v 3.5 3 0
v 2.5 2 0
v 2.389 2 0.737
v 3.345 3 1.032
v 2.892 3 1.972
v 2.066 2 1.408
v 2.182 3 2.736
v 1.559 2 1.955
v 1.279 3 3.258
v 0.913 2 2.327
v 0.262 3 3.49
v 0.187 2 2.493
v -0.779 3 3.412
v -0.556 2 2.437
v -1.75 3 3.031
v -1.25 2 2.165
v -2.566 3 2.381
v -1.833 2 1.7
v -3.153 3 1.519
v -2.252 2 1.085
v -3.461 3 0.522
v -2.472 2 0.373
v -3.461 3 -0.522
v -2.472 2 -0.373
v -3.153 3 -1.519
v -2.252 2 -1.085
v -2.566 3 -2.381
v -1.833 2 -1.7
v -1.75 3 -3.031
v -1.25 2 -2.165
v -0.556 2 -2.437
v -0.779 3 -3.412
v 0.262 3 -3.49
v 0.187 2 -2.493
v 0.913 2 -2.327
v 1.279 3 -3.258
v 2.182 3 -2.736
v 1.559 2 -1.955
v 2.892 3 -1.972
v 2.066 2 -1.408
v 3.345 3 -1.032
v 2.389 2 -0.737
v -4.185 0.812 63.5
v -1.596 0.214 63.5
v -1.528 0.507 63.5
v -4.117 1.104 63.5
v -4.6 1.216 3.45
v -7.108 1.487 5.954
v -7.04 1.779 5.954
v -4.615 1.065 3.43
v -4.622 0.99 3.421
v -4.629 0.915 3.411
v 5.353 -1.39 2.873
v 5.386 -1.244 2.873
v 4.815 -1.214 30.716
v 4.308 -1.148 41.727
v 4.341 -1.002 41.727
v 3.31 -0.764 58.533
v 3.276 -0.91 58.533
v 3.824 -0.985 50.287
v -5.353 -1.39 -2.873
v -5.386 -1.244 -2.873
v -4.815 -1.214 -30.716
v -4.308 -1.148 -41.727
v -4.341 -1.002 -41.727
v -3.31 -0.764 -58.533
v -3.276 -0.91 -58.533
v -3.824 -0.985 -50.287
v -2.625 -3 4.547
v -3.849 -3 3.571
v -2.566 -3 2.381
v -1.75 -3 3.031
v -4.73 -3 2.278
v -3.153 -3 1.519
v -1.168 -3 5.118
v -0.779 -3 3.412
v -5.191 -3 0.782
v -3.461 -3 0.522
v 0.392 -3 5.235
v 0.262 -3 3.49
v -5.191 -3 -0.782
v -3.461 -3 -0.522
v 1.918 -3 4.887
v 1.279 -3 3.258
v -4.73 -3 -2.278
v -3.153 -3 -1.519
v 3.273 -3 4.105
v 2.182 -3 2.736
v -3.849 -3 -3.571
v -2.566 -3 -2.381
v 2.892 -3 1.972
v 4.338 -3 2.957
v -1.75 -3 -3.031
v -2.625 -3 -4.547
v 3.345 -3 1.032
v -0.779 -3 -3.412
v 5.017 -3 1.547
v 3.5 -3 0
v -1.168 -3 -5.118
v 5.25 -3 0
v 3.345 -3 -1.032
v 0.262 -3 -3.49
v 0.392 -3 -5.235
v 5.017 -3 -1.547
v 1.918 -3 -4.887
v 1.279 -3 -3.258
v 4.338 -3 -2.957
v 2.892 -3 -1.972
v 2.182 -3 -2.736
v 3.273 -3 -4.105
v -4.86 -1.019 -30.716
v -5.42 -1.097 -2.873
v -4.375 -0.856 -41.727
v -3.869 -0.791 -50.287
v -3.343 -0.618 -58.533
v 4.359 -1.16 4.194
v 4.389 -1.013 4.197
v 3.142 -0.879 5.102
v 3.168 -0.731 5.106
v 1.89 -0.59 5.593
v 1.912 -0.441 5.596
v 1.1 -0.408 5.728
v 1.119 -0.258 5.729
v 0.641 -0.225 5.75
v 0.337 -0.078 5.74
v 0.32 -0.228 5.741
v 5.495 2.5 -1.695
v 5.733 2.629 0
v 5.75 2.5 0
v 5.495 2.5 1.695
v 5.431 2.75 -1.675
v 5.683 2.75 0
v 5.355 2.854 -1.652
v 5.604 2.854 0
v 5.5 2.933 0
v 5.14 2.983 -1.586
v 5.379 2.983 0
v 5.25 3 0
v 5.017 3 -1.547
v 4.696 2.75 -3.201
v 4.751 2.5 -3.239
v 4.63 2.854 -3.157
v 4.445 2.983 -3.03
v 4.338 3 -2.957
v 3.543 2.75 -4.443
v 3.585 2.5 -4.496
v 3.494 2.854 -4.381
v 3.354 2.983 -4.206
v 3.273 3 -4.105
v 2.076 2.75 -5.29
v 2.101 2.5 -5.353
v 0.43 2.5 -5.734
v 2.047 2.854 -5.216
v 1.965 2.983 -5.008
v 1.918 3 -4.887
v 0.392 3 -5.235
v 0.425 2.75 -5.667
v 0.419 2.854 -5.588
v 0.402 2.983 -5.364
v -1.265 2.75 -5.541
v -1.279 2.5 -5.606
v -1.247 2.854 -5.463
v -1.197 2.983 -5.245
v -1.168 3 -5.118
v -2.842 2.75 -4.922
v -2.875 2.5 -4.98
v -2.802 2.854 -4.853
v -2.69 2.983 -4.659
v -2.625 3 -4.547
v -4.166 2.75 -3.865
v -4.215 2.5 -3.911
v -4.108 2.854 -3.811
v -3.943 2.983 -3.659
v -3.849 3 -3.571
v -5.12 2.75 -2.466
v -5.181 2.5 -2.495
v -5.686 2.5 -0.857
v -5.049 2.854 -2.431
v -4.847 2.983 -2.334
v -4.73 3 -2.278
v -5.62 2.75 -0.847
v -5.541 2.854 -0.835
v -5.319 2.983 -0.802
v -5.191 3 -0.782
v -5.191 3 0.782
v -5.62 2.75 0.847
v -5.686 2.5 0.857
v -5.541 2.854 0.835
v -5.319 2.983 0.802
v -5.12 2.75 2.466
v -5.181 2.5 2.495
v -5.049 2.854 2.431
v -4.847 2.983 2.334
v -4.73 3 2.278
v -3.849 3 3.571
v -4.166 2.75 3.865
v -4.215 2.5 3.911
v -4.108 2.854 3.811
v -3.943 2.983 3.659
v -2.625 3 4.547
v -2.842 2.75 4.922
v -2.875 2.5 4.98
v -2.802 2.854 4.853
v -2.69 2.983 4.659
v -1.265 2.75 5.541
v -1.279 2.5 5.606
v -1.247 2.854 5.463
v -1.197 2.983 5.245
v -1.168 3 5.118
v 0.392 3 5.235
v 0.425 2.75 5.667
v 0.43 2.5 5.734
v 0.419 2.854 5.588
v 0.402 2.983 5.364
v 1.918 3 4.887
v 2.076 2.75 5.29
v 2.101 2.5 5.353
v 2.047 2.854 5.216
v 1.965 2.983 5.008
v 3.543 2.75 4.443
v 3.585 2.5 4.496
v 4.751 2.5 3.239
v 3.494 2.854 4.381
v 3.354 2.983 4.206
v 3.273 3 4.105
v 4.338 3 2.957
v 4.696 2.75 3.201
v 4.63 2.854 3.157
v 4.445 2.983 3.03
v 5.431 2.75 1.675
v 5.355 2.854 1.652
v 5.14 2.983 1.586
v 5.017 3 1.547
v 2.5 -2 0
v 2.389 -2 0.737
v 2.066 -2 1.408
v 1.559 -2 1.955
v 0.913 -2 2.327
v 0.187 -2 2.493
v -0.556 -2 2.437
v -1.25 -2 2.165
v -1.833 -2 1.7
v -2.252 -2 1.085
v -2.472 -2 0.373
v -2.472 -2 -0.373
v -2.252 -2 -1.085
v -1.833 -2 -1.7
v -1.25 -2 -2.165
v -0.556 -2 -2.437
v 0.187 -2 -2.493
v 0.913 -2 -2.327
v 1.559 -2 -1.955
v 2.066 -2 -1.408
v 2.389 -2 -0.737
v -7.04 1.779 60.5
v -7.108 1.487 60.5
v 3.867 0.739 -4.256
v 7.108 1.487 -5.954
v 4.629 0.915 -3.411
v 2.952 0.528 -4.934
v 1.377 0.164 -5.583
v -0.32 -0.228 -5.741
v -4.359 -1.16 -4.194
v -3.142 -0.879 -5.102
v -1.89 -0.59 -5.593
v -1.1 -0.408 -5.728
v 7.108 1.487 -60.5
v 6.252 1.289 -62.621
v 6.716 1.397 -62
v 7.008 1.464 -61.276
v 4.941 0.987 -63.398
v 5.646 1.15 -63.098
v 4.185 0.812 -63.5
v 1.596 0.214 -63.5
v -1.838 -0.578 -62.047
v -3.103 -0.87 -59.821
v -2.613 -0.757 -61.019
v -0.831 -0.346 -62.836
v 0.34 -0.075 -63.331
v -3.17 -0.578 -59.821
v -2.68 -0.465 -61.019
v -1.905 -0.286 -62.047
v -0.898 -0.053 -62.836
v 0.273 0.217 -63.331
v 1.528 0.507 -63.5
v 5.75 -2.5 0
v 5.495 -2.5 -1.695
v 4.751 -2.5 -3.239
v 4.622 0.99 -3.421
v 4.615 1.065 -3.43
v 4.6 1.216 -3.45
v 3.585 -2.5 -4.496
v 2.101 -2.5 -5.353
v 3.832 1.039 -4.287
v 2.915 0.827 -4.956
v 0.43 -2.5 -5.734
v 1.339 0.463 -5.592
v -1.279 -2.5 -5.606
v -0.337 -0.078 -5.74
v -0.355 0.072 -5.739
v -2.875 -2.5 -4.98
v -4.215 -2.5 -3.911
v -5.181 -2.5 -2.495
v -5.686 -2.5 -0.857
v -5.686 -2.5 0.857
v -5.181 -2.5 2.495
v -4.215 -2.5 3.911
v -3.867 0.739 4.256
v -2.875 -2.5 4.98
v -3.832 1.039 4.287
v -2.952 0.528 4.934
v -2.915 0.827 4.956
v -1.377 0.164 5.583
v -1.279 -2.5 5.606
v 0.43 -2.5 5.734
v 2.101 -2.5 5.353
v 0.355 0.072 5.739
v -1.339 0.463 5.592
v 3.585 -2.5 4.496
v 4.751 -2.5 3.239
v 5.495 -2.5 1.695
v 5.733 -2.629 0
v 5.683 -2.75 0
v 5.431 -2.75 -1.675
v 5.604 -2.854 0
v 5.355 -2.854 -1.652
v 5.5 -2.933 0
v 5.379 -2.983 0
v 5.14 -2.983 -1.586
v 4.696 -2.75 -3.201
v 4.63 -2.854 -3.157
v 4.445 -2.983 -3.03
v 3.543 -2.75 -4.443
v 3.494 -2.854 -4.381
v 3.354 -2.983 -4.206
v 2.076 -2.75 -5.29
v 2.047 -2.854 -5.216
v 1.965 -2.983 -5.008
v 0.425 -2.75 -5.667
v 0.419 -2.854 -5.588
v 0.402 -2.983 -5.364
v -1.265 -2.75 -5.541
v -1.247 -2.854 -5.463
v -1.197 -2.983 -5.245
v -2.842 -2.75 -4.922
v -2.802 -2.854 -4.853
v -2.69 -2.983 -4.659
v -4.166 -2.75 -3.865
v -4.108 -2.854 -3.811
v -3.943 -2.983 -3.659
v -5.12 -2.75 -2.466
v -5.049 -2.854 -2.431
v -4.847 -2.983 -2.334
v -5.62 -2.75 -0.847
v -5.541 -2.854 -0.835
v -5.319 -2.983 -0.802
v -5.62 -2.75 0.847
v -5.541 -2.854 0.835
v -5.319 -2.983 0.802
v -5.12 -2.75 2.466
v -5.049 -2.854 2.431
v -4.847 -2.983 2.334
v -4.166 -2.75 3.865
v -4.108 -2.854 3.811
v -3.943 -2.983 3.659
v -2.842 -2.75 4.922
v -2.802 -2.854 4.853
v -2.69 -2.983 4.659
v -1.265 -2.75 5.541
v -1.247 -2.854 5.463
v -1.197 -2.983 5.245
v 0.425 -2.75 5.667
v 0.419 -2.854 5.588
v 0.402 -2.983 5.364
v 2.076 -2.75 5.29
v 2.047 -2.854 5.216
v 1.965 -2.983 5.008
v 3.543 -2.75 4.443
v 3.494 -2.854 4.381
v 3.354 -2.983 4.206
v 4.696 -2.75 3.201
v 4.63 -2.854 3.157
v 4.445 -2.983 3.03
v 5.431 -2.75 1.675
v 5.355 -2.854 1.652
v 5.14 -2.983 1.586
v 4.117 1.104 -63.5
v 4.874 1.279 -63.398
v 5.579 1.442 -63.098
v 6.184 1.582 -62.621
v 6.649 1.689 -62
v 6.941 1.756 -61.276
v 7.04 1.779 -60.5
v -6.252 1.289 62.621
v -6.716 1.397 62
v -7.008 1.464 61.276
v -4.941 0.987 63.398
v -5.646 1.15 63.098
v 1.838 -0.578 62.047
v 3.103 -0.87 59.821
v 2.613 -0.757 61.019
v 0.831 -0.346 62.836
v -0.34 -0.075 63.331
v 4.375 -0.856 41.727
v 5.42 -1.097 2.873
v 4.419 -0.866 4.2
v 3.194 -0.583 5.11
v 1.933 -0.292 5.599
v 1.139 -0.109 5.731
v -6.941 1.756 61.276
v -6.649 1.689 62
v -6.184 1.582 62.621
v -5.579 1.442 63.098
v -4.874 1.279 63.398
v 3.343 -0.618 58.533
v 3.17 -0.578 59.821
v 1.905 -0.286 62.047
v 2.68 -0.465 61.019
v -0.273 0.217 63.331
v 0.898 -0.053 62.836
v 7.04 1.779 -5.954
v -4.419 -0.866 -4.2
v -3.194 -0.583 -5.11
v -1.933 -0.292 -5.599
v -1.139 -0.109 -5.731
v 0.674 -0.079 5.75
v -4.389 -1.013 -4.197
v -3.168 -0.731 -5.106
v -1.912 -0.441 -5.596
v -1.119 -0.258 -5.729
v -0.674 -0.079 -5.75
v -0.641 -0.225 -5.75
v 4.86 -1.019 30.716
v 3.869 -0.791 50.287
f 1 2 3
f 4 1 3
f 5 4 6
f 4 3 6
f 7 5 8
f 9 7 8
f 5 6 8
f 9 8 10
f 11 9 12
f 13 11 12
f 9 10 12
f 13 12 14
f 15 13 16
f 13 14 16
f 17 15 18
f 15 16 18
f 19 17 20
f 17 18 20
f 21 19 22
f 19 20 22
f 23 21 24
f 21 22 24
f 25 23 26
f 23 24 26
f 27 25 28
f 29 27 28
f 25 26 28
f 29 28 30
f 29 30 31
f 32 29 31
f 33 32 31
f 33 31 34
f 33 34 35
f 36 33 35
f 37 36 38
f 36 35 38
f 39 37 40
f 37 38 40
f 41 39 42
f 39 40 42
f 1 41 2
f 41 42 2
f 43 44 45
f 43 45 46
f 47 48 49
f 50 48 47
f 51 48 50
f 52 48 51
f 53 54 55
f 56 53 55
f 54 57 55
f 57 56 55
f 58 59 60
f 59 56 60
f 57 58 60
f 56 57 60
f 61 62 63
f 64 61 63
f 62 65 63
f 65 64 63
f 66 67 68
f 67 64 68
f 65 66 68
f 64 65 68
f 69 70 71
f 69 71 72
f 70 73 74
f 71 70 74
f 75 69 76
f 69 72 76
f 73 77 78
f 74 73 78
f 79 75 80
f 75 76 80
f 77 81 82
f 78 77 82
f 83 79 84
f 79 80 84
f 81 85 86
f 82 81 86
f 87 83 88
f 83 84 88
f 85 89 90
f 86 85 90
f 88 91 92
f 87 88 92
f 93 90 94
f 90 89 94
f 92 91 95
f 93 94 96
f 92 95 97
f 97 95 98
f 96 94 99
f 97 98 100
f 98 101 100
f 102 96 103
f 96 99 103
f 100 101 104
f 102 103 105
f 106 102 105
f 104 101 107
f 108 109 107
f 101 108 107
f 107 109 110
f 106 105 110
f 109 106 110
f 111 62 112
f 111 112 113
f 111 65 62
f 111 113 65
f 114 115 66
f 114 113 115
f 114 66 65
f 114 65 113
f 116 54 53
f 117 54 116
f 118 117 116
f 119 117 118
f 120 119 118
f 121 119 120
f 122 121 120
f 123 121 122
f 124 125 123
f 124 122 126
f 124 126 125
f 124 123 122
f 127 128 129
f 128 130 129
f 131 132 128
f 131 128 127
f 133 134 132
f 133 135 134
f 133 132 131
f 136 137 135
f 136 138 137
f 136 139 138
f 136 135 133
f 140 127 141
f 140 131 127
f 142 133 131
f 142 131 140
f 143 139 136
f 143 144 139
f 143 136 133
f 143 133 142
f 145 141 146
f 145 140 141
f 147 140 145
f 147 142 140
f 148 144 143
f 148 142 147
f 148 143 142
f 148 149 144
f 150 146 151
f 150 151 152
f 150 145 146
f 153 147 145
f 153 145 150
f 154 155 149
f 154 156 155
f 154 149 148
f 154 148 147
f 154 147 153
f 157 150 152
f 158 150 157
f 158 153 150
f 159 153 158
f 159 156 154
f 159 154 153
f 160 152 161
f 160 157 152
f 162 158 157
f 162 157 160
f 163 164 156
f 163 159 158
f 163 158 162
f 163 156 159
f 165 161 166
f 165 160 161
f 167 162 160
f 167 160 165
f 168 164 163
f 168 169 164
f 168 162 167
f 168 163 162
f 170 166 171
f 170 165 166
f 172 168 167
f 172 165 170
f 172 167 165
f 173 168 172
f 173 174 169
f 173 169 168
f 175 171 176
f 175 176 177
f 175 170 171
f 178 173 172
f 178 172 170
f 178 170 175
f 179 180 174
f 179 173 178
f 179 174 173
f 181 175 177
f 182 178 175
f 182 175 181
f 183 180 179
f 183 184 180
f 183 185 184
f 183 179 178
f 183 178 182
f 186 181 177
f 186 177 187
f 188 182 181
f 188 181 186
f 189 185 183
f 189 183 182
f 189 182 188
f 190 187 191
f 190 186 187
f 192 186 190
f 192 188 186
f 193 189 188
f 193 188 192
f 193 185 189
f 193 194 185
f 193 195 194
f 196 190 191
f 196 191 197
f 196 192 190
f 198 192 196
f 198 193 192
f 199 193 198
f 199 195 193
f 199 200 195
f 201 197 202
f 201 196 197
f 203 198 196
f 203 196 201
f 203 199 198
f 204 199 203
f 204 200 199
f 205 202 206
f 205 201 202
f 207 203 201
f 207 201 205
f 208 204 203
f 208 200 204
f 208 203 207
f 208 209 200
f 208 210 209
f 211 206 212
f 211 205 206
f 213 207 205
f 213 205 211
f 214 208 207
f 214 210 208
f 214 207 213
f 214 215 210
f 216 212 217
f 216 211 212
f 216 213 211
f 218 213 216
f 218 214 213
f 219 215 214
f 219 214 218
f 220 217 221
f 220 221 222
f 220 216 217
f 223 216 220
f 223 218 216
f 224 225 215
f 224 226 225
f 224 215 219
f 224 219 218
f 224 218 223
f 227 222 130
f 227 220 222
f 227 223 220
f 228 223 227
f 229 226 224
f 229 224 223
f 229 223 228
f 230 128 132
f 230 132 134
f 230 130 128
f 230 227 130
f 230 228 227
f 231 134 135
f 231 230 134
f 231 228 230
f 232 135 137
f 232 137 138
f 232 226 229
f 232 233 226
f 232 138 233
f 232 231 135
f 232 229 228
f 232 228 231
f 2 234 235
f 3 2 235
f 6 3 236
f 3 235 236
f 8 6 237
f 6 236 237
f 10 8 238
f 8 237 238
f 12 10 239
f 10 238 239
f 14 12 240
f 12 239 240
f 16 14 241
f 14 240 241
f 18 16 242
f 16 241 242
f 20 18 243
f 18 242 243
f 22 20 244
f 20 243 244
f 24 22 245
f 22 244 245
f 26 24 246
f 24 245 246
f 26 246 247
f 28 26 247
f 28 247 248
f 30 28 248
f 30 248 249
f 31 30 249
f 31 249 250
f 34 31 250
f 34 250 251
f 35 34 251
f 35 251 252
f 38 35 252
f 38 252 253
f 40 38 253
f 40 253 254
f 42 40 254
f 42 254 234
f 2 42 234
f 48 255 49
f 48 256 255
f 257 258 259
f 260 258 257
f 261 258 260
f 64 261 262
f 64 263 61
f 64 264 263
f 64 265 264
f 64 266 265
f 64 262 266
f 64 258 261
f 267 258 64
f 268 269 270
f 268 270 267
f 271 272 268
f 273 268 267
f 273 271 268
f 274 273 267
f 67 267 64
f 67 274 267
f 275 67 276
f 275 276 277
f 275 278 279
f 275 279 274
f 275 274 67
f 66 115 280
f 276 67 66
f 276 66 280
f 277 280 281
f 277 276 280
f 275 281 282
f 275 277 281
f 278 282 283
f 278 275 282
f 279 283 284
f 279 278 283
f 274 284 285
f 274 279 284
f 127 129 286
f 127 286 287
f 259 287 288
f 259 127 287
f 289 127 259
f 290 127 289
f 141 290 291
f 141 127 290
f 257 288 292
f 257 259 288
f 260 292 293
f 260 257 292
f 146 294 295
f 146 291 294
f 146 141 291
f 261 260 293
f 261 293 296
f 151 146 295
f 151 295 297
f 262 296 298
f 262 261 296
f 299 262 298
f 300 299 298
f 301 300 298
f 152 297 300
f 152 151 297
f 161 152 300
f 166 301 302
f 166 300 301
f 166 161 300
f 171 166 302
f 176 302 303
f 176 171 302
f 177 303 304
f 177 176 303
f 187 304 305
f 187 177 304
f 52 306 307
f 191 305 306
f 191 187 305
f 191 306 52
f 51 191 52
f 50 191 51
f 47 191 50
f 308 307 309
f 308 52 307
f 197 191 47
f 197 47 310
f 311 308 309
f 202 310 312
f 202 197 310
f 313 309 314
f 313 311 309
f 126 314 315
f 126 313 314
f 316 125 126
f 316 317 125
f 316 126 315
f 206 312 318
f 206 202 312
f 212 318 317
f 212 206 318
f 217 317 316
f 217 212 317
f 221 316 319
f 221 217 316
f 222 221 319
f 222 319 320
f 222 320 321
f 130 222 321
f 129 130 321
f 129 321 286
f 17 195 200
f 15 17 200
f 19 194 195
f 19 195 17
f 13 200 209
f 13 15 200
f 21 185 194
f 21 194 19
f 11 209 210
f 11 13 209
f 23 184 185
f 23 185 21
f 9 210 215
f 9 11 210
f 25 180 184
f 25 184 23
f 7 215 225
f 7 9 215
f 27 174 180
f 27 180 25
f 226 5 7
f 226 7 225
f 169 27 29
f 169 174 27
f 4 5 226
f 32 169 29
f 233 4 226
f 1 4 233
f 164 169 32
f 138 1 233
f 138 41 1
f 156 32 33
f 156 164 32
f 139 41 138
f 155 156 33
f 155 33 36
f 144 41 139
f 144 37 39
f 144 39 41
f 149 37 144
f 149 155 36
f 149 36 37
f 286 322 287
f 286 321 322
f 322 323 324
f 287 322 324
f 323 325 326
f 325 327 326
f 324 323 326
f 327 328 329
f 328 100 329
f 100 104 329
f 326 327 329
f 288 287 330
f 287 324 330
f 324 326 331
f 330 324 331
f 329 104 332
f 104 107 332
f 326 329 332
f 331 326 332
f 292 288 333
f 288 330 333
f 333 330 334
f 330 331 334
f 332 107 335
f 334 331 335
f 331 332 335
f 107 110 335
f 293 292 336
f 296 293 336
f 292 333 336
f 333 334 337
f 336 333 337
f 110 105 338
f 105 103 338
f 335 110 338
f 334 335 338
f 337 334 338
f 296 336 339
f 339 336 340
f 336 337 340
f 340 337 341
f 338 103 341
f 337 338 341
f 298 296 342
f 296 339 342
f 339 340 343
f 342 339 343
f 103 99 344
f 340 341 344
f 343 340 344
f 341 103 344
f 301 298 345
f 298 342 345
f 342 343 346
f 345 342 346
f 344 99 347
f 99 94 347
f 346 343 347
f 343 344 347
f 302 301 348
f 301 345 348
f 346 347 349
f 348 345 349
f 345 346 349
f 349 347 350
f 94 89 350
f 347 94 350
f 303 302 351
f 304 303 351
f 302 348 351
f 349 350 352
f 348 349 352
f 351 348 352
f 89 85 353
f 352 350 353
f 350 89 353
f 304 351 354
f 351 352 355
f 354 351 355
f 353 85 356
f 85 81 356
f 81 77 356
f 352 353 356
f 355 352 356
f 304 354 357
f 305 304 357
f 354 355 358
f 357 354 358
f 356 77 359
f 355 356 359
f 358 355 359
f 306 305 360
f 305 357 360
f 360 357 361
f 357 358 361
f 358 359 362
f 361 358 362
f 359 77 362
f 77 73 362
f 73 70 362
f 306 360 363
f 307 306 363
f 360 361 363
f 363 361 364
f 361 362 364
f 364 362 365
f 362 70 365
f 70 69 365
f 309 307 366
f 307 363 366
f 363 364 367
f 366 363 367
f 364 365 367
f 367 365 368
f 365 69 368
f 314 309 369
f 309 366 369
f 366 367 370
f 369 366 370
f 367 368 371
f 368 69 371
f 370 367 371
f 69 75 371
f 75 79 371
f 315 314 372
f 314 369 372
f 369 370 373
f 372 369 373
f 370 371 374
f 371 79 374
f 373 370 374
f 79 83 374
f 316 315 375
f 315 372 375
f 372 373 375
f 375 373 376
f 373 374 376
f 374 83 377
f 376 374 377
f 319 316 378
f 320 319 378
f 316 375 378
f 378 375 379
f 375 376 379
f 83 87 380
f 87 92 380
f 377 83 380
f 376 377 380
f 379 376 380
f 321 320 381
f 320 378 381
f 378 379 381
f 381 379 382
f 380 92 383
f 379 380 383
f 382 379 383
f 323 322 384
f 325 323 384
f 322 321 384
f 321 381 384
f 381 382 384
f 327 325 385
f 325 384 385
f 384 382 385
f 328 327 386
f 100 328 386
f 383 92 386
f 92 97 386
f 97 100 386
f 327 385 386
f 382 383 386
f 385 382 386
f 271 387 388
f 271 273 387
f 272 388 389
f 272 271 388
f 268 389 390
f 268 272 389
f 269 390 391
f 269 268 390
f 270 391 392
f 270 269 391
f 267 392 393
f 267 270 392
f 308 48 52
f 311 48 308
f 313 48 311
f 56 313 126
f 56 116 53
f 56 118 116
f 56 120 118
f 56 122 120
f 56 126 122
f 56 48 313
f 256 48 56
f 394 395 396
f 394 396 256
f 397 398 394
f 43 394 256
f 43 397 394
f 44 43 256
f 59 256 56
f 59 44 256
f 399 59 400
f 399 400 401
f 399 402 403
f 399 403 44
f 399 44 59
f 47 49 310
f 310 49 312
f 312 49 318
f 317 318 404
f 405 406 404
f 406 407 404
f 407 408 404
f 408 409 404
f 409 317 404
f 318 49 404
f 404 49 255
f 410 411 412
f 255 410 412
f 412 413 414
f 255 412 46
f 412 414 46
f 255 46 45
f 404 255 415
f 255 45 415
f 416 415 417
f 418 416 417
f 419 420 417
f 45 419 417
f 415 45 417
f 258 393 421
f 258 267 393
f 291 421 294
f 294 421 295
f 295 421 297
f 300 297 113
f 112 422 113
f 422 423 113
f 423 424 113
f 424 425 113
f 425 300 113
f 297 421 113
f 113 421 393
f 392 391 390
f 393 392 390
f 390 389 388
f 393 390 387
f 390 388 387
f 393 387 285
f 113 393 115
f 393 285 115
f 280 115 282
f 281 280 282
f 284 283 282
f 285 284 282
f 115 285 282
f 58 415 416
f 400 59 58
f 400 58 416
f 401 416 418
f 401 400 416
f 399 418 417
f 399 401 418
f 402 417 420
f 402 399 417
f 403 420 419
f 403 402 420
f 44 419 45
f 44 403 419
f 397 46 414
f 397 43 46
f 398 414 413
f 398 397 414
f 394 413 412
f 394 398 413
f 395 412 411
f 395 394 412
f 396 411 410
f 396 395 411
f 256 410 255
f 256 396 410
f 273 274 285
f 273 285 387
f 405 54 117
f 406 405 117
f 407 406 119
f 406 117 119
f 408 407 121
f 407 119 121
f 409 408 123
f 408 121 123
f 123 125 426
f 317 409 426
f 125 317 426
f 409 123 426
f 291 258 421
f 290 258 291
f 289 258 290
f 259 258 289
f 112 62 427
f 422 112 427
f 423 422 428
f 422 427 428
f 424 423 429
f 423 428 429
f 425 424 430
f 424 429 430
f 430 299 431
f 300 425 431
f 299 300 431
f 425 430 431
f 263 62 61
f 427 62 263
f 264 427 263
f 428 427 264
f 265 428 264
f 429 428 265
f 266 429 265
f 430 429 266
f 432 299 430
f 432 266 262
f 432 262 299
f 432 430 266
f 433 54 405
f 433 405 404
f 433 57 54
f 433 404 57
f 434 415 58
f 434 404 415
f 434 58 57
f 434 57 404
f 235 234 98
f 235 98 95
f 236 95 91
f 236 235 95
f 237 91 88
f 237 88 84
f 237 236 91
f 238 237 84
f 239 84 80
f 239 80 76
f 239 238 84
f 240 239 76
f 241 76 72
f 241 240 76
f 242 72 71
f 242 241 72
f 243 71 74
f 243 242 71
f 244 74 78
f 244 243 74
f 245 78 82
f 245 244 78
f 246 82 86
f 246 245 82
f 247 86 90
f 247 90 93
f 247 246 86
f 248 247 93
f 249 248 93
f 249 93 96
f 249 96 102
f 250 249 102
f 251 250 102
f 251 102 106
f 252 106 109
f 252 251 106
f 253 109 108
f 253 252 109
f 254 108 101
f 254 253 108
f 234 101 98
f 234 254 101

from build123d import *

# Parameters (mm, degrees)
SKETCH1_R           = 5.75
BOSS_EXTRUDE1_DEPTH = 3
BOSS_EXTRUDE2_DEPTH = 0.15
CIRPATTERN1_COUNT   = 2
SKETCH4_R           = 2.5
CUT_EXTRUDE1_DEPTH  = 7.0000001
FILLET1_R           = 0.5
CHAMFER1_SIZE       = 1


with BuildPart() as part:
    # Sketch1 → Boss-Extrude1 (new body, symmetric)
    with BuildSketch(Plane(origin=(0, 0, 0), x_dir=(1, 0, 0), z_dir=(0, 1, 0))):
        Circle(SKETCH1_R)
    extrude(amount=BOSS_EXTRUDE1_DEPTH, both=True)

    # Sketch3 → Boss-Extrude2 (add, symmetric)
    with BuildSketch(Plane(origin=(0, 0, 0), x_dir=(0.974370065, -0.224951054, 0), z_dir=(-0.224951054, -0.974370065, 0))):
        with BuildLine():
            Line((-7.260028368, 5.954486728), (-4.178380211, 2.872838571))
            add(Edge.make_bspline(
                [(0.674853163, 5.75), (-2.561446771, 5.75), (-4.178380211, 2.872838571)],
                knots=[0, 0, 0, 1.04763155, 1.04763155, 1.04763155], degree=2, weights=[1, 0.865916884, 1]))
            add(Edge.make_bspline(
                [(5.528086537, 2.872838571), (3.911153097, 5.75), (0.674853163, 5.75)],
                knots=[5.235553758, 5.235553758, 5.235553758, 6.283185307, 6.283185307, 6.283185307], degree=2, weights=[1, 0.865916884, 1]))
            add(Edge.make_bspline(
                [(5.528086537, 2.872838571), (5.499674649, 33.834937196), (3.406999963, 56.967753658), (3.396685559, 58.53294855)],
                knots=[0, 0, 0, 0, 0.918193758, 0.918193758, 0.918193758, 0.918193758], degree=3))
            ThreePointArc((3.396685559, 58.53294855), (1.920659701, 62.047163849), (-1.603205879, 63.5))
            Line((-1.603205879, 63.5), (-4.260028368, 63.5))
            ThreePointArc((-4.260028368, 63.5), (-6.381348711, 62.621320344), (-7.260028368, 60.5))
            Line((-7.260028368, 60.5), (-7.260028368, 5.954486728))
        make_face()
    boss_extrude2 = extrude(amount=BOSS_EXTRUDE2_DEPTH, both=True)

    # CirPattern1: Boss-Extrude2 ×2 about axis
    cirpattern1_axis = Axis((0, 3, 0), (0, -1, 0))
    for i in range(1, CIRPATTERN1_COUNT):
        add(boss_extrude2.rotate(cirpattern1_axis, i * 360 / CIRPATTERN1_COUNT))

    # Sketch4 → Cut-Extrude1 (cut, through all)
    with BuildSketch(Plane.XZ.offset(3)):
        Circle(SKETCH4_R)
    extrude(amount=-CUT_EXTRUDE1_DEPTH, mode=Mode.SUBTRACT)

    # Fillet1
    fillet1_edges = [part.edges().sort_by_distance(p)[0] for p in [
        (-5.75, -3, 0),
        (-5.75, 3, 0),
    ]]
    fillet(fillet1_edges, radius=FILLET1_R)

    # Chamfer1
    chamfer1_edges = [part.edges().sort_by_distance(p)[0] for p in [
        (-2.5, 3, 0),
        (-2.5, -3, 0),
    ]]
    chamfer(chamfer1_edges, length=CHAMFER1_SIZE)


solid = part.part
